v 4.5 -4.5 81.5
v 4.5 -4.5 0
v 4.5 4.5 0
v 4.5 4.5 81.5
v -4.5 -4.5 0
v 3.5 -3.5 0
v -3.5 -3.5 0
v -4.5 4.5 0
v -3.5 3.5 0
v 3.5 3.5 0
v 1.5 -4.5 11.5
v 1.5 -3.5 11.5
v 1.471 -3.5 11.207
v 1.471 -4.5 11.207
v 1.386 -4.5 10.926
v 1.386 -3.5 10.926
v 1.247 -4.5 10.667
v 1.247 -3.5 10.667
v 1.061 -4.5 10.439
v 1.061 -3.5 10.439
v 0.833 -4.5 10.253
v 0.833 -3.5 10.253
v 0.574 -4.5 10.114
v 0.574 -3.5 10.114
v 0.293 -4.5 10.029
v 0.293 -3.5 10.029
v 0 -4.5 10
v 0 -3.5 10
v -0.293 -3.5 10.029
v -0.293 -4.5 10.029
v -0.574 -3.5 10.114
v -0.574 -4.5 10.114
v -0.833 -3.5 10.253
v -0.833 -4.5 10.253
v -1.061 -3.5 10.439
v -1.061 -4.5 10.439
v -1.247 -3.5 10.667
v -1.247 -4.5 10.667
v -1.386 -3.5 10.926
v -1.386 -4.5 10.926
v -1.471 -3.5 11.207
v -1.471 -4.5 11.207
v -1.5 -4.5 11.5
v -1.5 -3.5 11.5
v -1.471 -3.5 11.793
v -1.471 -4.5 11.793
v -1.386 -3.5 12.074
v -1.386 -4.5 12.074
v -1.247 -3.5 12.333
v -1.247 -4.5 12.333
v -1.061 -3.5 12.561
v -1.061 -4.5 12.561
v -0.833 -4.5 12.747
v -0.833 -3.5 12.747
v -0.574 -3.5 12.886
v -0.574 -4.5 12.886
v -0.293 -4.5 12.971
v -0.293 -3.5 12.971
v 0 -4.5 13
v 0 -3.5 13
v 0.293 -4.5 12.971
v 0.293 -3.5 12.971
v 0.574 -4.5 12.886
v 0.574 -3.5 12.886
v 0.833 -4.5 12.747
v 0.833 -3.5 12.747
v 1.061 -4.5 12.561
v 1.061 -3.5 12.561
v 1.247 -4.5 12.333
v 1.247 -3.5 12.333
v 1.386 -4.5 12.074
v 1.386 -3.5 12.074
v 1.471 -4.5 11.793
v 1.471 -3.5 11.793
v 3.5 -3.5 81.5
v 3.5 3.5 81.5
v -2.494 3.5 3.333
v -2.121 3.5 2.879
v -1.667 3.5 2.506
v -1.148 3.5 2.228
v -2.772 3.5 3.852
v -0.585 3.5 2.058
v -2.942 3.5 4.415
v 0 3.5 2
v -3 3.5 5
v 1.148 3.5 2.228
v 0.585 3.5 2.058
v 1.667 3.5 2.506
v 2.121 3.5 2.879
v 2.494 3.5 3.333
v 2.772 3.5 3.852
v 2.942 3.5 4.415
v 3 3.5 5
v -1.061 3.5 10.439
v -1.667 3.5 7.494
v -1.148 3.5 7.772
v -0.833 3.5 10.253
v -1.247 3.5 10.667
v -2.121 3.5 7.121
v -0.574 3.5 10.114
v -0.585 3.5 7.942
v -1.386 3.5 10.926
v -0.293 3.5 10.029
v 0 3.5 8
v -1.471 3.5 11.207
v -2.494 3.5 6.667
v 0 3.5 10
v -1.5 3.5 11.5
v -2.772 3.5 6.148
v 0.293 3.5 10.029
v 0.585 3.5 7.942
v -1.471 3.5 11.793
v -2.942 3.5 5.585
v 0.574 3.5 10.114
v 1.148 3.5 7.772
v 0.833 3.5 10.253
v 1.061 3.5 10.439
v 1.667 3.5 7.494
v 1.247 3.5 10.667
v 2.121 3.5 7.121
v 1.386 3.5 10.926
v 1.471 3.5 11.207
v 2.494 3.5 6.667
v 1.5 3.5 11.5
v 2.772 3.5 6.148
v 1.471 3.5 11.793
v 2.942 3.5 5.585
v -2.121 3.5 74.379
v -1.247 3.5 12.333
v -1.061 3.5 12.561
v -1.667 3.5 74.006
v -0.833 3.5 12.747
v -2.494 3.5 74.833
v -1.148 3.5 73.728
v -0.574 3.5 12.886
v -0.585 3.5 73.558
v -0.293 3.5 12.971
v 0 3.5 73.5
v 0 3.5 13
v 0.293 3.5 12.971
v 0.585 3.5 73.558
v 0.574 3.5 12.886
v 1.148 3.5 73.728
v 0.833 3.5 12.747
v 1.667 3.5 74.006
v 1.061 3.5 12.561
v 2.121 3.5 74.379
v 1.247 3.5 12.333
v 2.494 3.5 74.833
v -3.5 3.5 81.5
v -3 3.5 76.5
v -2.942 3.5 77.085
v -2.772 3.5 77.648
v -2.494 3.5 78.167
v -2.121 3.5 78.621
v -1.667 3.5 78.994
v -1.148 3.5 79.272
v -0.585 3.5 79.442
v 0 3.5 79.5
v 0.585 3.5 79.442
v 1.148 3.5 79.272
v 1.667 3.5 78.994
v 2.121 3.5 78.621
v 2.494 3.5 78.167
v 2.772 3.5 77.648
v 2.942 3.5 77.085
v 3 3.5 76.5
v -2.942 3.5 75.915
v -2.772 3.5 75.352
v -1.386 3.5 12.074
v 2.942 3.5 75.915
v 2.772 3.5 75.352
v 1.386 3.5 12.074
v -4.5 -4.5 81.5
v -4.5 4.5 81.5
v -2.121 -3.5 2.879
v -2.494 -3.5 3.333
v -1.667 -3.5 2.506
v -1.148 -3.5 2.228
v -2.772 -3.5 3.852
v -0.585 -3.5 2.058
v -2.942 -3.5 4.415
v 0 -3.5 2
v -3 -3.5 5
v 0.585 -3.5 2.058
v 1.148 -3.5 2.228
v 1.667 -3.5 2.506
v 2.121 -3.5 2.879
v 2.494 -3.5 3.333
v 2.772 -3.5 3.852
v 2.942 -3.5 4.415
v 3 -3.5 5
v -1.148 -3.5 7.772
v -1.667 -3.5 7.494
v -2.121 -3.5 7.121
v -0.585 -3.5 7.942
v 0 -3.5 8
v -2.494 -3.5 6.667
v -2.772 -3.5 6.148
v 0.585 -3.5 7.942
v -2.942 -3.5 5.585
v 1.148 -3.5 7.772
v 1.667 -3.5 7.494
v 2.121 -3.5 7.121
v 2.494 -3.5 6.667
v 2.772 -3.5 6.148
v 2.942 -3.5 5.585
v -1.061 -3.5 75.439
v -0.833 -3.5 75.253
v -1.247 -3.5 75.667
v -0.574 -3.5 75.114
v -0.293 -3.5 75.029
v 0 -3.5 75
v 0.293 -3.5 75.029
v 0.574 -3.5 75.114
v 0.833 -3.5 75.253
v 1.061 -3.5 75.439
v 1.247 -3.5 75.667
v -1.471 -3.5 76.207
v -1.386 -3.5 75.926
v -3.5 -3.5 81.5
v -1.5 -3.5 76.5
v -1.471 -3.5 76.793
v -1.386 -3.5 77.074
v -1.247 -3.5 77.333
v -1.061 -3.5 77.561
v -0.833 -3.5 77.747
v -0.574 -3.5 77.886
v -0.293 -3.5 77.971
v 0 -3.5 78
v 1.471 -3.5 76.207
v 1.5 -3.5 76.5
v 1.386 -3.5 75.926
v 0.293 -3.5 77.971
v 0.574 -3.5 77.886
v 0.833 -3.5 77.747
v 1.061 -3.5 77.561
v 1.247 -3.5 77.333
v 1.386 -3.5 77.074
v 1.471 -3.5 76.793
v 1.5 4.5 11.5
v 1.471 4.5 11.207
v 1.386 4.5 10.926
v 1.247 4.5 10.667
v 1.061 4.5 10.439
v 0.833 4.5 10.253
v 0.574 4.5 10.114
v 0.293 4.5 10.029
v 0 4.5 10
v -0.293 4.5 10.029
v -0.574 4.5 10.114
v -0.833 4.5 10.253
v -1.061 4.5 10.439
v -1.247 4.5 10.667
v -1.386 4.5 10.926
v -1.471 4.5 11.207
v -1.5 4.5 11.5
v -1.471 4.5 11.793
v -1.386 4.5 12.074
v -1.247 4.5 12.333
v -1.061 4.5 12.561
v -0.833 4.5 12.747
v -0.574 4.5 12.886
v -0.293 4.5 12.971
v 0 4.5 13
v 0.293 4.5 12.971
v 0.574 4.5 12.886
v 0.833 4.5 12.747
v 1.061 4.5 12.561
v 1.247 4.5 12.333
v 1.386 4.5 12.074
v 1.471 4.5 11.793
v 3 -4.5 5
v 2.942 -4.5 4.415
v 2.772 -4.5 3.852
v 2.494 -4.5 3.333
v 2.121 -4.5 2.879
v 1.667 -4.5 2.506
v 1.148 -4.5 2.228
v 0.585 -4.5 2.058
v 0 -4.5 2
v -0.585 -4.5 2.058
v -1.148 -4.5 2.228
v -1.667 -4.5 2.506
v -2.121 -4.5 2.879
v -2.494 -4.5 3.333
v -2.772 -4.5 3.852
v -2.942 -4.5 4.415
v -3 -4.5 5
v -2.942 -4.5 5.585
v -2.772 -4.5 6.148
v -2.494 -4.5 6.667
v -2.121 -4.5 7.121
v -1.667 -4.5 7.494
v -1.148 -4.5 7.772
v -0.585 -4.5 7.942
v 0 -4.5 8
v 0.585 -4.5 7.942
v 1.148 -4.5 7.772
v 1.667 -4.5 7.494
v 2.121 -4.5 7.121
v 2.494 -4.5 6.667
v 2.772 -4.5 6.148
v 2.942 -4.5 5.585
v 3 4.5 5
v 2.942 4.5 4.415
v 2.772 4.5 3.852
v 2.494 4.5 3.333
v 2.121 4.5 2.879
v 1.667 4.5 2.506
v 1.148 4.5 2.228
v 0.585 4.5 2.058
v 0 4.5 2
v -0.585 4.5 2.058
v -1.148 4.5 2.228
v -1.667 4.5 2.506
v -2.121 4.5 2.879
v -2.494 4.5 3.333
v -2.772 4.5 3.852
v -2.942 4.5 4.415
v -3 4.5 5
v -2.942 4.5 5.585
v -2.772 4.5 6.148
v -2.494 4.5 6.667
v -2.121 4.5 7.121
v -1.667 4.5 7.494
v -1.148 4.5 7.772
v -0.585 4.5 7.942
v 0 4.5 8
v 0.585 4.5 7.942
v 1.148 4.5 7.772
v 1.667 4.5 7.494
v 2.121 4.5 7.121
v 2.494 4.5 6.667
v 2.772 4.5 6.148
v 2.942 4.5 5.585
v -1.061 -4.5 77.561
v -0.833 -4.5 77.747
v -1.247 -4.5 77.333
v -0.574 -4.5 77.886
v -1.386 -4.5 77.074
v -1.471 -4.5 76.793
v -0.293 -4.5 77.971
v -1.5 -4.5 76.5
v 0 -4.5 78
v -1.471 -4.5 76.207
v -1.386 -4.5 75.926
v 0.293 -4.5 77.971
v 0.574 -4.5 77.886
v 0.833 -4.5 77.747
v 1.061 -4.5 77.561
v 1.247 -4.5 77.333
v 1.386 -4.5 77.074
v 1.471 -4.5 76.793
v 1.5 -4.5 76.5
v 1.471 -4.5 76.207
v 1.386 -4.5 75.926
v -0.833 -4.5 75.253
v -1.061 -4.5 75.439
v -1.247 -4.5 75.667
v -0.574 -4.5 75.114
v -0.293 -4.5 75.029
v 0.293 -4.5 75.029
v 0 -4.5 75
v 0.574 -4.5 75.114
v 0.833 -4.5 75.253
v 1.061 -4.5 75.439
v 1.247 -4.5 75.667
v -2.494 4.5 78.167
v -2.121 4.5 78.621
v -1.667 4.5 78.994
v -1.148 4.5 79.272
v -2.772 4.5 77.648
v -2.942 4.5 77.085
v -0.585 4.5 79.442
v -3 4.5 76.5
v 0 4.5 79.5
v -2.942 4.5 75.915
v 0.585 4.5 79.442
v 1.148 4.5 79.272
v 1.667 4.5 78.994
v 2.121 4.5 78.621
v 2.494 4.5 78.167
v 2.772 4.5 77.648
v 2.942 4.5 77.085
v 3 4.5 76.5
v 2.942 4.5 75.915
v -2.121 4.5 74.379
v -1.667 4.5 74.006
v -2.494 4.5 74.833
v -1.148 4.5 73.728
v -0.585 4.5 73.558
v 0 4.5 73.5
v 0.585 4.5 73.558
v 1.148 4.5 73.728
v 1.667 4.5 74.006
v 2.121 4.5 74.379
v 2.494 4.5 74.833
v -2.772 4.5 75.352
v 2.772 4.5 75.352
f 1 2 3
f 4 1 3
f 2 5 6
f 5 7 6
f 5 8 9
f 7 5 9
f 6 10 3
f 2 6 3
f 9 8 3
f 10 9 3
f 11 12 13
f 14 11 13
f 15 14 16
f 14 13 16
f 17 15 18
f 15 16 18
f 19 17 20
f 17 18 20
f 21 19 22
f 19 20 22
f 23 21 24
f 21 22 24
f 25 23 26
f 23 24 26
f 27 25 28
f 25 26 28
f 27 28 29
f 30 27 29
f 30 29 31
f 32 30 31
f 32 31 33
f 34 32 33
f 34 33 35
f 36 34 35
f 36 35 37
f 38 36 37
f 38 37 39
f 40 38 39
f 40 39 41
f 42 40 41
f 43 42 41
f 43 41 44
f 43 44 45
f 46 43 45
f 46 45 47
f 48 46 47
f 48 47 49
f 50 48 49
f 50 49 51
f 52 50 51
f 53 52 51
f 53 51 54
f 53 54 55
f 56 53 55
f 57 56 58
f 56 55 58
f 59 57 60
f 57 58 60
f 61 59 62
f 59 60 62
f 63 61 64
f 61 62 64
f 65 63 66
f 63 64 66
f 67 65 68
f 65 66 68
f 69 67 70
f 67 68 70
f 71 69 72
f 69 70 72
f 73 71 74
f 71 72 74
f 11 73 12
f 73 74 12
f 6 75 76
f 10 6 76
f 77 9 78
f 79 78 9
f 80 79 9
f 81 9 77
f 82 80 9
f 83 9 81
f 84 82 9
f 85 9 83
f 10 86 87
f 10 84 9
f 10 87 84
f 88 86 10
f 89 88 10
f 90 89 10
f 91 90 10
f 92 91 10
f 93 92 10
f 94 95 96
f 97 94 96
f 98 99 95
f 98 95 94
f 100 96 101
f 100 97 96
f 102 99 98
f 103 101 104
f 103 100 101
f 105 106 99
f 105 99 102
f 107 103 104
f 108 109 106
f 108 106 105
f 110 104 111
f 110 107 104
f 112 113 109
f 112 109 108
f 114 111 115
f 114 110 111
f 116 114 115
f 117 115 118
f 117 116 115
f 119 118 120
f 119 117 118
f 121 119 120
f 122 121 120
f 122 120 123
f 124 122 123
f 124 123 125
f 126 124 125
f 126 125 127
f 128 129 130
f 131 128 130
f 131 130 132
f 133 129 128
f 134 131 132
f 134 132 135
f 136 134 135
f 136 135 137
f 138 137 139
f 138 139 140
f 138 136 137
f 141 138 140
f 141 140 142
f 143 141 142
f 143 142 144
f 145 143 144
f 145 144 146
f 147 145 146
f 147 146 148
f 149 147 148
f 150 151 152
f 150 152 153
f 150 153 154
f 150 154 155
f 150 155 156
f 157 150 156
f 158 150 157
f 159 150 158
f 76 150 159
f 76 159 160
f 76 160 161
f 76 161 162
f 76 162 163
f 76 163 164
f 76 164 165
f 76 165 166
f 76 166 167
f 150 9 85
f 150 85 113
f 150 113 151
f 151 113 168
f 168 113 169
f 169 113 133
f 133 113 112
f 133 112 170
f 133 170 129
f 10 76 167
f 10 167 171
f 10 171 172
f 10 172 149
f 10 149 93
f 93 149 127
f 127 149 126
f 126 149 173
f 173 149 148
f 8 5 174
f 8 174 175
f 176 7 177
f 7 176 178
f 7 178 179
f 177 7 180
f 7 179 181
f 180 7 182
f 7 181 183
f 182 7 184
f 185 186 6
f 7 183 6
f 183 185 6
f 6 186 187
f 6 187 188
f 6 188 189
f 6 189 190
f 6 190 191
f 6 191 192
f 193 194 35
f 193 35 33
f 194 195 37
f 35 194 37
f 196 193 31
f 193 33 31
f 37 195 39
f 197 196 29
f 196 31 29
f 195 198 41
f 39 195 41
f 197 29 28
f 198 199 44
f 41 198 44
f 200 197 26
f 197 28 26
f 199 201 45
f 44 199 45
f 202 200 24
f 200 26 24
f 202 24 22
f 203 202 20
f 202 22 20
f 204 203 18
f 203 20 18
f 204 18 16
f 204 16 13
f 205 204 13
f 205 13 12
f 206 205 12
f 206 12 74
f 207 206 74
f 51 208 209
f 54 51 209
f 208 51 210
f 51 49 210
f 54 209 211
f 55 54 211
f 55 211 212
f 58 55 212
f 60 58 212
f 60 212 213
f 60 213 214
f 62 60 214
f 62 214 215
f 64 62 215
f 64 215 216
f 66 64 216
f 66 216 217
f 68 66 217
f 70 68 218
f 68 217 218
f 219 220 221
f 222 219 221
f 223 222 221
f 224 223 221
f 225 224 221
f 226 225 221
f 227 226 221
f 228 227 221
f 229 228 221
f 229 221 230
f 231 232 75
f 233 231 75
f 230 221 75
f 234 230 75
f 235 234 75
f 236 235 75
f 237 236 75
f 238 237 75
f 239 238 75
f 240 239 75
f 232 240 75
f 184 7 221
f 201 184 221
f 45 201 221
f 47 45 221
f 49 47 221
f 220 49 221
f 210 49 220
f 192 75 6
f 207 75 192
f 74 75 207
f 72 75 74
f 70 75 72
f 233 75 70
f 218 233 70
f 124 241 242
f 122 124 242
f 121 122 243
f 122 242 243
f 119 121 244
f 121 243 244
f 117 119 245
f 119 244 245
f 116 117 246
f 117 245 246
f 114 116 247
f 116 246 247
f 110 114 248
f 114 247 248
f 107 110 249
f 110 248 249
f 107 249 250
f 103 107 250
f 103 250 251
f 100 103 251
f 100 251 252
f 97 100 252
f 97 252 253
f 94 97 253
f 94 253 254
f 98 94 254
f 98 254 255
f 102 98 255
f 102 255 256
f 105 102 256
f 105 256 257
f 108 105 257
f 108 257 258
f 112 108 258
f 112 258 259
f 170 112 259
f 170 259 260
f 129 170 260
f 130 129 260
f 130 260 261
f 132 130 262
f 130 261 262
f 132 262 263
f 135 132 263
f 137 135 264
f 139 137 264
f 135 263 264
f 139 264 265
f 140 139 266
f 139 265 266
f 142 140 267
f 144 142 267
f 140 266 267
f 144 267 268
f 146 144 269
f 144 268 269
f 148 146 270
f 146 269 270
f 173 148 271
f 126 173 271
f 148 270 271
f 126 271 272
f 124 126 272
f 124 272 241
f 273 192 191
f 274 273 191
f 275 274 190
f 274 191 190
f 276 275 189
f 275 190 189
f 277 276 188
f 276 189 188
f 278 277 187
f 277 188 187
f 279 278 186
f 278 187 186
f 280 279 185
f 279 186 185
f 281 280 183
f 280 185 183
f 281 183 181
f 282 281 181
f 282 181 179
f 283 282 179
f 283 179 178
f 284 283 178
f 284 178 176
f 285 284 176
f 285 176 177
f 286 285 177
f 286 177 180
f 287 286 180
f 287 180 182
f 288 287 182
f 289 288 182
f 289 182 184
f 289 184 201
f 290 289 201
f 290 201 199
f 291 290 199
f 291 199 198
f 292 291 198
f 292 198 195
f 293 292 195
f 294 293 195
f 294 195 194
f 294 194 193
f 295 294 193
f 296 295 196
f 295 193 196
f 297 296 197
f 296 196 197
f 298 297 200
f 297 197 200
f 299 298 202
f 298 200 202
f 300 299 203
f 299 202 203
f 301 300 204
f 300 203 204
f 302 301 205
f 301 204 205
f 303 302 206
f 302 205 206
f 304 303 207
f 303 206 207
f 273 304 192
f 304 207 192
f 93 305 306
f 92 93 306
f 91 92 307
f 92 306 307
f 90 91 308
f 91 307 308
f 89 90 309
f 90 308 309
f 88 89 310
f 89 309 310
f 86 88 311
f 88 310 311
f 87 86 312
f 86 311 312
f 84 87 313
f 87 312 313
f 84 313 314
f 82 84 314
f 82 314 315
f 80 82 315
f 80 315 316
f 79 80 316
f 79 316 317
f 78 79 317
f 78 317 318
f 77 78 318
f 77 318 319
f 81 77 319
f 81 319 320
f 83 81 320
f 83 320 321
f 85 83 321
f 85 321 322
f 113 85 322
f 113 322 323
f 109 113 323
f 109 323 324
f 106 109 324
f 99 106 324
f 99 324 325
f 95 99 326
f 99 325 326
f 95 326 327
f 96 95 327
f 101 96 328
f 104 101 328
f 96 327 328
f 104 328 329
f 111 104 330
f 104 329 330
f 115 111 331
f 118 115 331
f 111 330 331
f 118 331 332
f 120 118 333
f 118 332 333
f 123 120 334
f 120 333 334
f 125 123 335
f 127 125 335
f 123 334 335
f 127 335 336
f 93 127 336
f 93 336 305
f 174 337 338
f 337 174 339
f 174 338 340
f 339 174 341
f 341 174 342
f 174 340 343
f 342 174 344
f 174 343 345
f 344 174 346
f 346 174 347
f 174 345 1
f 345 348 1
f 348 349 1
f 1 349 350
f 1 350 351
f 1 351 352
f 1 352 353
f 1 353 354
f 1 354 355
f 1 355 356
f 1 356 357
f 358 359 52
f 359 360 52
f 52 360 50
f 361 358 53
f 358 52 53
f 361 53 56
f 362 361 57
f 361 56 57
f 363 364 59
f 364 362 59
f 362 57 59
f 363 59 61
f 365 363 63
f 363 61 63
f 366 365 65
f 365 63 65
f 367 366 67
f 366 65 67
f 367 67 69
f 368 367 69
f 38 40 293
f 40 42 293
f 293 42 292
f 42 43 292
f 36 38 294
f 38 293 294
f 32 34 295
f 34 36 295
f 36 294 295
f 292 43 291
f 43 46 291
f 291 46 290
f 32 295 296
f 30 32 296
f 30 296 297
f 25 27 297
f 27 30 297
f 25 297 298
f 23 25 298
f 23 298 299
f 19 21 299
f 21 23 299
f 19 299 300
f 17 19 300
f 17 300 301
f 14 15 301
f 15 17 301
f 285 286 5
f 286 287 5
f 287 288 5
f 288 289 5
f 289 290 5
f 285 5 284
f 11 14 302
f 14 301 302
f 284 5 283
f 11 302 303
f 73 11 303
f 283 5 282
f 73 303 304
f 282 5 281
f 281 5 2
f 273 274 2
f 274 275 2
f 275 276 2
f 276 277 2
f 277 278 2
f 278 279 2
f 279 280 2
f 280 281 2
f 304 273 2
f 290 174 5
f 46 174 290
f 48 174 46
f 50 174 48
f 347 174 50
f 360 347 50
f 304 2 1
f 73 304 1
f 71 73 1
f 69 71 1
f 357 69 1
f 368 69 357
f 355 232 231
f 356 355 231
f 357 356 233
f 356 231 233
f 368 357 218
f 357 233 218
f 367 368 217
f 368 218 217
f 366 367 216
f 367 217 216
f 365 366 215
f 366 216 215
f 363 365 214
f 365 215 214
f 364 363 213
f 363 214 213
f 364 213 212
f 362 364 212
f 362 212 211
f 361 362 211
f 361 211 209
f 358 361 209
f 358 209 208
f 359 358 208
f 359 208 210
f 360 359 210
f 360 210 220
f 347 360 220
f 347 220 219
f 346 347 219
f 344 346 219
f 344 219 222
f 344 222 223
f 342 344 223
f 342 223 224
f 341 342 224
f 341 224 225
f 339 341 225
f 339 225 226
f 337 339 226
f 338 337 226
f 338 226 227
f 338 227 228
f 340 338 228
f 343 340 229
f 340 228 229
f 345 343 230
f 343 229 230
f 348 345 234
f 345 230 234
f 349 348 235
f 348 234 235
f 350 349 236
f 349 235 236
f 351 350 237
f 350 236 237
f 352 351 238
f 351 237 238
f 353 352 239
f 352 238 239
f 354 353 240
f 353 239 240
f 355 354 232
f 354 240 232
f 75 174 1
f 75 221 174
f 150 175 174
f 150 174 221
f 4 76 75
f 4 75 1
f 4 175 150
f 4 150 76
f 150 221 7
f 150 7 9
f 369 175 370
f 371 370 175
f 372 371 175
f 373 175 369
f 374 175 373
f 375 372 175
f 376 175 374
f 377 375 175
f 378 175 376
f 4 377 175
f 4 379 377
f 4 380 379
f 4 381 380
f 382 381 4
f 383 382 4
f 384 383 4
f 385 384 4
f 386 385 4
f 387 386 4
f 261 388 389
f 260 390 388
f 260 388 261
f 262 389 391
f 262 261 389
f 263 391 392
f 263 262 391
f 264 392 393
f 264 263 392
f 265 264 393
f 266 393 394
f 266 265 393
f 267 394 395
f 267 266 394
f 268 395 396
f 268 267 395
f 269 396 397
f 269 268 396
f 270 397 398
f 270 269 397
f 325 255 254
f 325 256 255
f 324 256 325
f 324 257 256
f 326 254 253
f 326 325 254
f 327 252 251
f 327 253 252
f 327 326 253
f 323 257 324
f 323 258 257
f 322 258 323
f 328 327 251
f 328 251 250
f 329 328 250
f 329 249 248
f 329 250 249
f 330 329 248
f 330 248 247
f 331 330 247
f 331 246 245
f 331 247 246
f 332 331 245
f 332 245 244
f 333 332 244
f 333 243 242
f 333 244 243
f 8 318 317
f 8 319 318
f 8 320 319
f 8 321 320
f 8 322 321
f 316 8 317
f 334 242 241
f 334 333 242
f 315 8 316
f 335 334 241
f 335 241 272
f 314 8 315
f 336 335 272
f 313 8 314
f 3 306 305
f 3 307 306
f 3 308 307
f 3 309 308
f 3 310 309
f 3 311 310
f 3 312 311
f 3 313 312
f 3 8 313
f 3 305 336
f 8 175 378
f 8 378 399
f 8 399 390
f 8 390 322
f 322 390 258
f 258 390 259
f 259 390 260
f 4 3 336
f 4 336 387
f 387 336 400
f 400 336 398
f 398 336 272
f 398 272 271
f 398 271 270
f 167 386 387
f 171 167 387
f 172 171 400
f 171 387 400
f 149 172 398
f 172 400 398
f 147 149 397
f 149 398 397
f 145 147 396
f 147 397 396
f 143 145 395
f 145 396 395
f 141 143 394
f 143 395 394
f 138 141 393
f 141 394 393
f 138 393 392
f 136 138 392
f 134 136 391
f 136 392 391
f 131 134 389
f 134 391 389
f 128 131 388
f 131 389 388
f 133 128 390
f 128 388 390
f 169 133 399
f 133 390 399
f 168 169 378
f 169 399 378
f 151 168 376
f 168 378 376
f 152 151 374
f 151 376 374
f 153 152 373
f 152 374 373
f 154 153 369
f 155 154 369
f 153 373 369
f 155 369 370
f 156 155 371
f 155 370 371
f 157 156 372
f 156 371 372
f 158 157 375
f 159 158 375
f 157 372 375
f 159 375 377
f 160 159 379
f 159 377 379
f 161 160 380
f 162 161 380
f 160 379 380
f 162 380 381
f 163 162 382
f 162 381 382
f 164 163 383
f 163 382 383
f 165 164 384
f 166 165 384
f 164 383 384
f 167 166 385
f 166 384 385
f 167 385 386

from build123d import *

# Parameters (mm, degrees)
SKETCH_1_W          = 9
SKETCH_1_H          = 9
EXTRUDE_1_DEPTH     = 81.5
SKETCH_2_W          = 7
SKETCH_2_H          = 7
CUT_EXTRUDE_1_DEPTH = 101.5
SKETCH_3_R          = 3
SKETCH_3_R_2        = 1.5
CUT_EXTRUDE_2_DEPTH = 111.5
SKETCH_4_R          = 3
CUT_EXTRUDE_3_DEPTH = 1


with BuildPart() as part:
    # ｽｹｯﾁ1 → ﾎﾞｽ - 押し出し1 (new body)
    with BuildSketch(Plane.XY):
        Rectangle(SKETCH_1_W, SKETCH_1_H)
    extrude(amount=EXTRUDE_1_DEPTH)

    # ｽｹｯﾁ2 → ｶｯﾄ - 押し出し1 (cut)
    with BuildSketch(Plane.XY.offset(81.5)):
        Rectangle(SKETCH_2_W, SKETCH_2_H)
    extrude(amount=-CUT_EXTRUDE_1_DEPTH, mode=Mode.SUBTRACT)

    # ｽｹｯﾁ3 → ｶｯﾄ - 押し出し2 (cut)
    with BuildSketch(Plane(origin=(0, 4.5, 0), x_dir=(1, 0, 0), z_dir=(0, 1, 0))):
        with Locations((0, -5)):
            Circle(SKETCH_3_R)
        with Locations((0, -11.5)):
            Circle(SKETCH_3_R_2)
        with Locations((0, -76.5)):
            Circle(SKETCH_3_R_2)
    extrude(amount=-CUT_EXTRUDE_2_DEPTH, mode=Mode.SUBTRACT)

    # ｽｹｯﾁ4 → ｶｯﾄ - 押し出し3 (cut)
    with BuildSketch(Plane(origin=(0, 4.5, 0), x_dir=(1, 0, 0), z_dir=(0, 1, 0))):
        with Locations((0, -76.5)):
            Circle(SKETCH_4_R)
    extrude(amount=-CUT_EXTRUDE_3_DEPTH, mode=Mode.SUBTRACT)


solid = part.part
